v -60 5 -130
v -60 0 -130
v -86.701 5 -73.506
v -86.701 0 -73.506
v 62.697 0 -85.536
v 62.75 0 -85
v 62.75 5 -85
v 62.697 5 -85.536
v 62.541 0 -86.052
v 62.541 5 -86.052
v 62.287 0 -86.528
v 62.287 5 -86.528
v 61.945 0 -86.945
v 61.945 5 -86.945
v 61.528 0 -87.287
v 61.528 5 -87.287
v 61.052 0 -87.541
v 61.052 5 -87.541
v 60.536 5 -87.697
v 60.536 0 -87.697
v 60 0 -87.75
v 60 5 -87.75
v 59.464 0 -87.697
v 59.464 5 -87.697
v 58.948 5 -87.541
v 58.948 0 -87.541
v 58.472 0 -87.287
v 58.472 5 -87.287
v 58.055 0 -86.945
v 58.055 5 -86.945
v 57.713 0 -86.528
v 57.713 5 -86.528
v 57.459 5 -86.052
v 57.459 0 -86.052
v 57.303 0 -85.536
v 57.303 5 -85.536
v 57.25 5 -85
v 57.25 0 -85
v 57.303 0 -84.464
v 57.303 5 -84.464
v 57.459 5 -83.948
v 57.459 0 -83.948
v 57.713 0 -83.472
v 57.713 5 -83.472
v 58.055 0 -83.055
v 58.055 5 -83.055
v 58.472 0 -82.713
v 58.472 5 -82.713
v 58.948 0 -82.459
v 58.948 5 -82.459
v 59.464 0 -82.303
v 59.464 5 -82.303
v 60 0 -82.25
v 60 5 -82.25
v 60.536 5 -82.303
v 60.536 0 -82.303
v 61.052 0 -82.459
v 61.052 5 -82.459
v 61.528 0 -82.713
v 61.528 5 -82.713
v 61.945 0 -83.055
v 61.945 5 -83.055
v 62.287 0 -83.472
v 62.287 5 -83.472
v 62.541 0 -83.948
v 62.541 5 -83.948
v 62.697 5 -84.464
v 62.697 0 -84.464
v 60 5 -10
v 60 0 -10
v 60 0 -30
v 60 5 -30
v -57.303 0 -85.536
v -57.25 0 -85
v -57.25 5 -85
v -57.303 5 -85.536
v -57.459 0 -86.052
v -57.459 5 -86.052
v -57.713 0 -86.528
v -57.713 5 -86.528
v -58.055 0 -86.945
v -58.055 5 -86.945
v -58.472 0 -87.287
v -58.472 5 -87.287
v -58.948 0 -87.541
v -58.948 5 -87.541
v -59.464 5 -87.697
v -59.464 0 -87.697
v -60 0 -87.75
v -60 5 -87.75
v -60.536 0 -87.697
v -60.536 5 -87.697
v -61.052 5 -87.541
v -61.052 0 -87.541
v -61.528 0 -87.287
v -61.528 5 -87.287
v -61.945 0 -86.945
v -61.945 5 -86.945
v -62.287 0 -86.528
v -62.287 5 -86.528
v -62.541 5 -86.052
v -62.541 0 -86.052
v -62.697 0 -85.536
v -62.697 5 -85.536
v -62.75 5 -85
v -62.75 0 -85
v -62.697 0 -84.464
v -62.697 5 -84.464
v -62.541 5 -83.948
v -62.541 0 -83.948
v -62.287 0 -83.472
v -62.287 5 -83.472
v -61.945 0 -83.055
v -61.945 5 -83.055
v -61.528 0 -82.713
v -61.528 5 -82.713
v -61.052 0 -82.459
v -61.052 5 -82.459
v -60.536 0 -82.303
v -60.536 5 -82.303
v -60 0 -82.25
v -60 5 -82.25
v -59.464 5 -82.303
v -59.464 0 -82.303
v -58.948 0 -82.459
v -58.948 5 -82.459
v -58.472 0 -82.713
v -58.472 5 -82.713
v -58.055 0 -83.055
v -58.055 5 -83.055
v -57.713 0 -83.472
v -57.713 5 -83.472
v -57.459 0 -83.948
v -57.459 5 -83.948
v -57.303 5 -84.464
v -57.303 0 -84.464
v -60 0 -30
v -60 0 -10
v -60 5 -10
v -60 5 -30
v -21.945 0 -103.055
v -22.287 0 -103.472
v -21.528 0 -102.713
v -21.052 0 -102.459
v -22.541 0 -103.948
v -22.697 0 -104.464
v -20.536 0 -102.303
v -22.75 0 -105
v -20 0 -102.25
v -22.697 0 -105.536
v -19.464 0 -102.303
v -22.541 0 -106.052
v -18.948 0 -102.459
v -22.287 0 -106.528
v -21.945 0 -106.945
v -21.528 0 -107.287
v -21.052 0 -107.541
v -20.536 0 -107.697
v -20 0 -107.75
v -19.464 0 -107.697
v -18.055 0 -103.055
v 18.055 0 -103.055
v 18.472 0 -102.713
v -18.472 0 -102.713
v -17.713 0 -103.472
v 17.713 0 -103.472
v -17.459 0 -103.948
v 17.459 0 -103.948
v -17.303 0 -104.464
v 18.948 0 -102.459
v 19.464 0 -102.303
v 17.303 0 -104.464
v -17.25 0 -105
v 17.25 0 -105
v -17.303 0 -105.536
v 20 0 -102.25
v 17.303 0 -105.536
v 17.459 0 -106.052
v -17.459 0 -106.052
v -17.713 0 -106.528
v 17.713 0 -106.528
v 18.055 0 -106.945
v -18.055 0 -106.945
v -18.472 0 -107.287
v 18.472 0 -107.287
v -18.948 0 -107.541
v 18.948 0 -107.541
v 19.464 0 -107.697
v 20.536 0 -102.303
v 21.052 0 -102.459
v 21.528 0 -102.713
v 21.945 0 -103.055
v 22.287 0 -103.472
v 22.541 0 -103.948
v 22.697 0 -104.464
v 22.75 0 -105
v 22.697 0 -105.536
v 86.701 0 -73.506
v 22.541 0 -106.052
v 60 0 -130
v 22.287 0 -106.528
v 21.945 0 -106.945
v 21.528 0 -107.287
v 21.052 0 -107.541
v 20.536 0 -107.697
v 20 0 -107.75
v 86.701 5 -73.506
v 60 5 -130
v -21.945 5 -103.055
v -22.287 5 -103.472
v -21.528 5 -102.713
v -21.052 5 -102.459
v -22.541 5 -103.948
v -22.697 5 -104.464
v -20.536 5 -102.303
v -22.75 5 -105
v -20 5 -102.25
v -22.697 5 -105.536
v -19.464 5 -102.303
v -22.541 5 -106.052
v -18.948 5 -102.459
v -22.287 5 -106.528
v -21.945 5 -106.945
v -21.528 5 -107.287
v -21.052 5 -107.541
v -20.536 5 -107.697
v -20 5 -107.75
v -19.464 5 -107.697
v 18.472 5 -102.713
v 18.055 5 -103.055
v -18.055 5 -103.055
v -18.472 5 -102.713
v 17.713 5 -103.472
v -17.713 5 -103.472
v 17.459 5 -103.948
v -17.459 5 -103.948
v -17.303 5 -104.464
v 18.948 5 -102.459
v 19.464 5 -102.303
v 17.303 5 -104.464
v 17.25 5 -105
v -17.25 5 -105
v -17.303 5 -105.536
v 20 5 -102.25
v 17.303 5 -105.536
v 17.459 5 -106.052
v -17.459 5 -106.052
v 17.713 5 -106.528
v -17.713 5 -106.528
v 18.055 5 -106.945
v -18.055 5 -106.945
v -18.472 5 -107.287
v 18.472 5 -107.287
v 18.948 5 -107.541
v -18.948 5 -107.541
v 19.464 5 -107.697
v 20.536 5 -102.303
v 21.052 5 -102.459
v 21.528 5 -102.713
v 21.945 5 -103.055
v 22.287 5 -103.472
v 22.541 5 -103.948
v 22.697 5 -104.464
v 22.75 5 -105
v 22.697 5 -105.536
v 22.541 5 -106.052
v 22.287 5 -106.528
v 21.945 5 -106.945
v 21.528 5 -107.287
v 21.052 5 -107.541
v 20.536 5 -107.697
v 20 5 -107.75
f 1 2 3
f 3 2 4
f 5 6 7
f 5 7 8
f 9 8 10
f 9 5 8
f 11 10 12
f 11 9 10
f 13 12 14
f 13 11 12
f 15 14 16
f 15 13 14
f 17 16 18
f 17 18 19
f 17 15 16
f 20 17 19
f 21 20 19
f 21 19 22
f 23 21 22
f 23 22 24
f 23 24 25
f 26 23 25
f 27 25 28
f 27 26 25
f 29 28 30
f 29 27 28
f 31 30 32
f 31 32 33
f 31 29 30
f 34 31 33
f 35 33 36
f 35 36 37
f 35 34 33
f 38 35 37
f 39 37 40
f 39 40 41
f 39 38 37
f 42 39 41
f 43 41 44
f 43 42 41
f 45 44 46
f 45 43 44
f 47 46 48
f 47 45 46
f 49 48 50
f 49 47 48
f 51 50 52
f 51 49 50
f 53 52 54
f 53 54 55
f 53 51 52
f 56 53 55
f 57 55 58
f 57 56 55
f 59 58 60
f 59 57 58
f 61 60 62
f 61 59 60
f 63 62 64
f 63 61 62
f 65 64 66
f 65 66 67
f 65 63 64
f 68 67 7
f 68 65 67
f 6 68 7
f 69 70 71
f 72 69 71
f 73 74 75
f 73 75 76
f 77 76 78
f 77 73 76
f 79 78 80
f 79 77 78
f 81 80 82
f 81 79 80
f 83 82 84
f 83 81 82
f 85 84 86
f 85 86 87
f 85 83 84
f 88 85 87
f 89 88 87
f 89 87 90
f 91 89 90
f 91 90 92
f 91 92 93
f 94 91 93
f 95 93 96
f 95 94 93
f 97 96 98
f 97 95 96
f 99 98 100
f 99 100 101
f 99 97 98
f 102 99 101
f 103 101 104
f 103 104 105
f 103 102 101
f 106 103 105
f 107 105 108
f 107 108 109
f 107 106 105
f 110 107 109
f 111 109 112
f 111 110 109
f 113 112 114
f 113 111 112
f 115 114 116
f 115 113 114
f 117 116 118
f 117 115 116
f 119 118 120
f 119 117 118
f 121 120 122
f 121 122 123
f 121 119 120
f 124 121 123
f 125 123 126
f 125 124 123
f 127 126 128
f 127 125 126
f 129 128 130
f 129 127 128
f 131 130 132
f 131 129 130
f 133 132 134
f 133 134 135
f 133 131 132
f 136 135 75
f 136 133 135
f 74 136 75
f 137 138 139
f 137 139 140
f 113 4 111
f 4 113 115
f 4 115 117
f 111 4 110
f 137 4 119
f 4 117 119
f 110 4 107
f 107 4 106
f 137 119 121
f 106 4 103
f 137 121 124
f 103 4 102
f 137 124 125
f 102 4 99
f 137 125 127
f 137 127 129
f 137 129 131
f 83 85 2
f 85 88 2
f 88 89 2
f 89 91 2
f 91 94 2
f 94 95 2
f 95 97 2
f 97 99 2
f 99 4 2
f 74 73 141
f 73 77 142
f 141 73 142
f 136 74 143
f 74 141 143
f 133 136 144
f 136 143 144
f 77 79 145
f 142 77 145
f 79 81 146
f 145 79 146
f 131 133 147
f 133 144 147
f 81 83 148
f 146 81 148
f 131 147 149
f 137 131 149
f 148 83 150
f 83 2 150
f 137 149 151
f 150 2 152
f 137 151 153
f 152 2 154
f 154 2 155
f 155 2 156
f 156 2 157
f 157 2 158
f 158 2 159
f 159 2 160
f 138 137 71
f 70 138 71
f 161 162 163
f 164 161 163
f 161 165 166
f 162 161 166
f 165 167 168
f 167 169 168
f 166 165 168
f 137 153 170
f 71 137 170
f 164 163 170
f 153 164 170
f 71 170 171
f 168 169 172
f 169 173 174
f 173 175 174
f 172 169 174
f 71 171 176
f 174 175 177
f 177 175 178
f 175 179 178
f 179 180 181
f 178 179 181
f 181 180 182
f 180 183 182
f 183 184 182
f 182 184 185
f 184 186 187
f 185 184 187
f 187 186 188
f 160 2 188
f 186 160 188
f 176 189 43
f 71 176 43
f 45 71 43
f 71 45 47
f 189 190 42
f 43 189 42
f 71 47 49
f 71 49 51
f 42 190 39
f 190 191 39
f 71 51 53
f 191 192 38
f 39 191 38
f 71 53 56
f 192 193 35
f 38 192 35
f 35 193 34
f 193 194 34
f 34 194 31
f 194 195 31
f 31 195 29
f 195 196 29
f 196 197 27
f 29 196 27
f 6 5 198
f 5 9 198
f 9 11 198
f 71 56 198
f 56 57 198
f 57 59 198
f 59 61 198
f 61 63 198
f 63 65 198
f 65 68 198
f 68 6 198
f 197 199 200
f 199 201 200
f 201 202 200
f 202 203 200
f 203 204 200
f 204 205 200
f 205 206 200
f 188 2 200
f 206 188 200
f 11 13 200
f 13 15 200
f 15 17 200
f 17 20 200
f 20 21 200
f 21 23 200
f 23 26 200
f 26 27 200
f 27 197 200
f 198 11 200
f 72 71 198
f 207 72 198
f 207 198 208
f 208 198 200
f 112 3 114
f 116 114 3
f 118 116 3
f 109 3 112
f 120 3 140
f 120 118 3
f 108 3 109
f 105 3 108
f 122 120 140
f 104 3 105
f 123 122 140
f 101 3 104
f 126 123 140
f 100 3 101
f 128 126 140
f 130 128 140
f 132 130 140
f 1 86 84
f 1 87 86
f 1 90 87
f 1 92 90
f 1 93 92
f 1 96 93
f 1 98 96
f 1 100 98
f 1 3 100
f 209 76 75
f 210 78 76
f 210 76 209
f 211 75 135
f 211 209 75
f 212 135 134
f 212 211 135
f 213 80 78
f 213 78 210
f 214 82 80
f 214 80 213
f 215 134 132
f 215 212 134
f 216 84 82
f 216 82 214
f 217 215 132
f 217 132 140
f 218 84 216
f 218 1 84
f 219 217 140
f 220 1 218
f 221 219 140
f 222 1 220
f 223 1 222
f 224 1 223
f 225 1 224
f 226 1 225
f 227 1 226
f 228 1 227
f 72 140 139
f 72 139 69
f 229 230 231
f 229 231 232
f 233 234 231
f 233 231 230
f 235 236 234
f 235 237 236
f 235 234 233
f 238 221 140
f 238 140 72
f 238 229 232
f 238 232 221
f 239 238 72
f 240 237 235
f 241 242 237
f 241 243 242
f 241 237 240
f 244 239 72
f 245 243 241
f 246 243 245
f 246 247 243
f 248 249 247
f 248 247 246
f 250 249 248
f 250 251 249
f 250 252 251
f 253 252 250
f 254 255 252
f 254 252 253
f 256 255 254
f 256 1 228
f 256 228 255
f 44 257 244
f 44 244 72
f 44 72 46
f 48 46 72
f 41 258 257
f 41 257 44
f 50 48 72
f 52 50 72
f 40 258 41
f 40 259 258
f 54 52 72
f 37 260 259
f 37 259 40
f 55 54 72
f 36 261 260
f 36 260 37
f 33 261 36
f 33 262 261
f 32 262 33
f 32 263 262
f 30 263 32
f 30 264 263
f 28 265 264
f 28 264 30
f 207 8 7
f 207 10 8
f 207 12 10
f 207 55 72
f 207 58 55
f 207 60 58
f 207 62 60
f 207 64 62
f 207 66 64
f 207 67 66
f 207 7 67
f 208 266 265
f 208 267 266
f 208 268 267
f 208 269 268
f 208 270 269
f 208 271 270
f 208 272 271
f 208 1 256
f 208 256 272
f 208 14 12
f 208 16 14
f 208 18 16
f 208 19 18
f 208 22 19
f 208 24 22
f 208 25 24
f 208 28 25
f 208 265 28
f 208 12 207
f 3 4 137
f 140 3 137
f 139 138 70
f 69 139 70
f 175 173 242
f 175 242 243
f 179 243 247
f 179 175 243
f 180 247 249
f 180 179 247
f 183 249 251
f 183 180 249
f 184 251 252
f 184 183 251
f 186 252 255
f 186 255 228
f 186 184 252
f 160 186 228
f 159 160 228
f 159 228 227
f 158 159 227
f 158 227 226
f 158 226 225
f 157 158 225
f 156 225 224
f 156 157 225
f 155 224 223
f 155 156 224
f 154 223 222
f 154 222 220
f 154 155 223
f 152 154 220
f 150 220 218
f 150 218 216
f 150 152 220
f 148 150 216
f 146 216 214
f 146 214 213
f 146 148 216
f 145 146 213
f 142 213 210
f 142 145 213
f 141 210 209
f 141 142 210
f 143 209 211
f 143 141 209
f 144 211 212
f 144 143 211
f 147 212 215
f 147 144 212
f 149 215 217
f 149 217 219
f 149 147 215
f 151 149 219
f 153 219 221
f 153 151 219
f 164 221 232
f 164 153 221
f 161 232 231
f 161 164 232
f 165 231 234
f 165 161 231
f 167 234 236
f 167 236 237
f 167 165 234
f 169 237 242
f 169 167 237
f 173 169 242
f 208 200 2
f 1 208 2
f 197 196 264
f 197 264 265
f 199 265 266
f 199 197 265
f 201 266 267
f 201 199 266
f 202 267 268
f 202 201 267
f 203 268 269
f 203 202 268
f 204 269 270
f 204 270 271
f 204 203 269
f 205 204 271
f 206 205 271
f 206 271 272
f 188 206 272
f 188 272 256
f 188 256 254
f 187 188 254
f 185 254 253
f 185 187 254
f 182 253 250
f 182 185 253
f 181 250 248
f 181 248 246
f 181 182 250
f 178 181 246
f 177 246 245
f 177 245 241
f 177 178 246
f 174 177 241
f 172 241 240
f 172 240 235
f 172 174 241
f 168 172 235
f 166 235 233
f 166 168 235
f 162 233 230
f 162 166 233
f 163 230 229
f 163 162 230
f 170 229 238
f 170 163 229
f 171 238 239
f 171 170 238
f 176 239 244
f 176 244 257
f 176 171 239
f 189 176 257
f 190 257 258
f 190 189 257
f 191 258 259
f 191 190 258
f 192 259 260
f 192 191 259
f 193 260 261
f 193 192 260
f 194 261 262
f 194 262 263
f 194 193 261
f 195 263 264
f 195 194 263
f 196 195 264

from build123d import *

# Parameters (mm, degrees)
SKETCH2_R           = 2.75
SKETCH2_W           = 60
SKETCH2_H           = 20
BOSS_EXTRUDE1_DEPTH = 5


with BuildPart() as part:
    # Sketch2 → Boss-Extrude1 (new body)
    with BuildSketch(Plane(origin=(0, 0, 0), x_dir=(1, 0, 0), z_dir=(0, 1, 0))):
        Polygon((-60, 30), (0, 30), (0, 130), (-20, 130), (-60, 130), (-86.701035329, 73.505676753), align=None)
        with Locations((-60, 85)):
            Circle(SKETCH2_R, mode=Mode.SUBTRACT)
        with Locations((-20, 105)):
            Circle(SKETCH2_R, mode=Mode.SUBTRACT)
        Polygon((0, 130), (0, 30), (60, 30), (86.701035329, 73.505676753), (60, 130), (20, 130), align=None)
        with Locations((60, 85)):
            Circle(SKETCH2_R, mode=Mode.SUBTRACT)
        with Locations((20, 105)):
            Circle(SKETCH2_R, mode=Mode.SUBTRACT)
        with Locations((-30, 20)):
            Rectangle(SKETCH2_W, SKETCH2_H)
        with Locations((30, 20)):
            Rectangle(SKETCH2_W, SKETCH2_H)
    extrude(amount=BOSS_EXTRUDE1_DEPTH)


solid = part.part
